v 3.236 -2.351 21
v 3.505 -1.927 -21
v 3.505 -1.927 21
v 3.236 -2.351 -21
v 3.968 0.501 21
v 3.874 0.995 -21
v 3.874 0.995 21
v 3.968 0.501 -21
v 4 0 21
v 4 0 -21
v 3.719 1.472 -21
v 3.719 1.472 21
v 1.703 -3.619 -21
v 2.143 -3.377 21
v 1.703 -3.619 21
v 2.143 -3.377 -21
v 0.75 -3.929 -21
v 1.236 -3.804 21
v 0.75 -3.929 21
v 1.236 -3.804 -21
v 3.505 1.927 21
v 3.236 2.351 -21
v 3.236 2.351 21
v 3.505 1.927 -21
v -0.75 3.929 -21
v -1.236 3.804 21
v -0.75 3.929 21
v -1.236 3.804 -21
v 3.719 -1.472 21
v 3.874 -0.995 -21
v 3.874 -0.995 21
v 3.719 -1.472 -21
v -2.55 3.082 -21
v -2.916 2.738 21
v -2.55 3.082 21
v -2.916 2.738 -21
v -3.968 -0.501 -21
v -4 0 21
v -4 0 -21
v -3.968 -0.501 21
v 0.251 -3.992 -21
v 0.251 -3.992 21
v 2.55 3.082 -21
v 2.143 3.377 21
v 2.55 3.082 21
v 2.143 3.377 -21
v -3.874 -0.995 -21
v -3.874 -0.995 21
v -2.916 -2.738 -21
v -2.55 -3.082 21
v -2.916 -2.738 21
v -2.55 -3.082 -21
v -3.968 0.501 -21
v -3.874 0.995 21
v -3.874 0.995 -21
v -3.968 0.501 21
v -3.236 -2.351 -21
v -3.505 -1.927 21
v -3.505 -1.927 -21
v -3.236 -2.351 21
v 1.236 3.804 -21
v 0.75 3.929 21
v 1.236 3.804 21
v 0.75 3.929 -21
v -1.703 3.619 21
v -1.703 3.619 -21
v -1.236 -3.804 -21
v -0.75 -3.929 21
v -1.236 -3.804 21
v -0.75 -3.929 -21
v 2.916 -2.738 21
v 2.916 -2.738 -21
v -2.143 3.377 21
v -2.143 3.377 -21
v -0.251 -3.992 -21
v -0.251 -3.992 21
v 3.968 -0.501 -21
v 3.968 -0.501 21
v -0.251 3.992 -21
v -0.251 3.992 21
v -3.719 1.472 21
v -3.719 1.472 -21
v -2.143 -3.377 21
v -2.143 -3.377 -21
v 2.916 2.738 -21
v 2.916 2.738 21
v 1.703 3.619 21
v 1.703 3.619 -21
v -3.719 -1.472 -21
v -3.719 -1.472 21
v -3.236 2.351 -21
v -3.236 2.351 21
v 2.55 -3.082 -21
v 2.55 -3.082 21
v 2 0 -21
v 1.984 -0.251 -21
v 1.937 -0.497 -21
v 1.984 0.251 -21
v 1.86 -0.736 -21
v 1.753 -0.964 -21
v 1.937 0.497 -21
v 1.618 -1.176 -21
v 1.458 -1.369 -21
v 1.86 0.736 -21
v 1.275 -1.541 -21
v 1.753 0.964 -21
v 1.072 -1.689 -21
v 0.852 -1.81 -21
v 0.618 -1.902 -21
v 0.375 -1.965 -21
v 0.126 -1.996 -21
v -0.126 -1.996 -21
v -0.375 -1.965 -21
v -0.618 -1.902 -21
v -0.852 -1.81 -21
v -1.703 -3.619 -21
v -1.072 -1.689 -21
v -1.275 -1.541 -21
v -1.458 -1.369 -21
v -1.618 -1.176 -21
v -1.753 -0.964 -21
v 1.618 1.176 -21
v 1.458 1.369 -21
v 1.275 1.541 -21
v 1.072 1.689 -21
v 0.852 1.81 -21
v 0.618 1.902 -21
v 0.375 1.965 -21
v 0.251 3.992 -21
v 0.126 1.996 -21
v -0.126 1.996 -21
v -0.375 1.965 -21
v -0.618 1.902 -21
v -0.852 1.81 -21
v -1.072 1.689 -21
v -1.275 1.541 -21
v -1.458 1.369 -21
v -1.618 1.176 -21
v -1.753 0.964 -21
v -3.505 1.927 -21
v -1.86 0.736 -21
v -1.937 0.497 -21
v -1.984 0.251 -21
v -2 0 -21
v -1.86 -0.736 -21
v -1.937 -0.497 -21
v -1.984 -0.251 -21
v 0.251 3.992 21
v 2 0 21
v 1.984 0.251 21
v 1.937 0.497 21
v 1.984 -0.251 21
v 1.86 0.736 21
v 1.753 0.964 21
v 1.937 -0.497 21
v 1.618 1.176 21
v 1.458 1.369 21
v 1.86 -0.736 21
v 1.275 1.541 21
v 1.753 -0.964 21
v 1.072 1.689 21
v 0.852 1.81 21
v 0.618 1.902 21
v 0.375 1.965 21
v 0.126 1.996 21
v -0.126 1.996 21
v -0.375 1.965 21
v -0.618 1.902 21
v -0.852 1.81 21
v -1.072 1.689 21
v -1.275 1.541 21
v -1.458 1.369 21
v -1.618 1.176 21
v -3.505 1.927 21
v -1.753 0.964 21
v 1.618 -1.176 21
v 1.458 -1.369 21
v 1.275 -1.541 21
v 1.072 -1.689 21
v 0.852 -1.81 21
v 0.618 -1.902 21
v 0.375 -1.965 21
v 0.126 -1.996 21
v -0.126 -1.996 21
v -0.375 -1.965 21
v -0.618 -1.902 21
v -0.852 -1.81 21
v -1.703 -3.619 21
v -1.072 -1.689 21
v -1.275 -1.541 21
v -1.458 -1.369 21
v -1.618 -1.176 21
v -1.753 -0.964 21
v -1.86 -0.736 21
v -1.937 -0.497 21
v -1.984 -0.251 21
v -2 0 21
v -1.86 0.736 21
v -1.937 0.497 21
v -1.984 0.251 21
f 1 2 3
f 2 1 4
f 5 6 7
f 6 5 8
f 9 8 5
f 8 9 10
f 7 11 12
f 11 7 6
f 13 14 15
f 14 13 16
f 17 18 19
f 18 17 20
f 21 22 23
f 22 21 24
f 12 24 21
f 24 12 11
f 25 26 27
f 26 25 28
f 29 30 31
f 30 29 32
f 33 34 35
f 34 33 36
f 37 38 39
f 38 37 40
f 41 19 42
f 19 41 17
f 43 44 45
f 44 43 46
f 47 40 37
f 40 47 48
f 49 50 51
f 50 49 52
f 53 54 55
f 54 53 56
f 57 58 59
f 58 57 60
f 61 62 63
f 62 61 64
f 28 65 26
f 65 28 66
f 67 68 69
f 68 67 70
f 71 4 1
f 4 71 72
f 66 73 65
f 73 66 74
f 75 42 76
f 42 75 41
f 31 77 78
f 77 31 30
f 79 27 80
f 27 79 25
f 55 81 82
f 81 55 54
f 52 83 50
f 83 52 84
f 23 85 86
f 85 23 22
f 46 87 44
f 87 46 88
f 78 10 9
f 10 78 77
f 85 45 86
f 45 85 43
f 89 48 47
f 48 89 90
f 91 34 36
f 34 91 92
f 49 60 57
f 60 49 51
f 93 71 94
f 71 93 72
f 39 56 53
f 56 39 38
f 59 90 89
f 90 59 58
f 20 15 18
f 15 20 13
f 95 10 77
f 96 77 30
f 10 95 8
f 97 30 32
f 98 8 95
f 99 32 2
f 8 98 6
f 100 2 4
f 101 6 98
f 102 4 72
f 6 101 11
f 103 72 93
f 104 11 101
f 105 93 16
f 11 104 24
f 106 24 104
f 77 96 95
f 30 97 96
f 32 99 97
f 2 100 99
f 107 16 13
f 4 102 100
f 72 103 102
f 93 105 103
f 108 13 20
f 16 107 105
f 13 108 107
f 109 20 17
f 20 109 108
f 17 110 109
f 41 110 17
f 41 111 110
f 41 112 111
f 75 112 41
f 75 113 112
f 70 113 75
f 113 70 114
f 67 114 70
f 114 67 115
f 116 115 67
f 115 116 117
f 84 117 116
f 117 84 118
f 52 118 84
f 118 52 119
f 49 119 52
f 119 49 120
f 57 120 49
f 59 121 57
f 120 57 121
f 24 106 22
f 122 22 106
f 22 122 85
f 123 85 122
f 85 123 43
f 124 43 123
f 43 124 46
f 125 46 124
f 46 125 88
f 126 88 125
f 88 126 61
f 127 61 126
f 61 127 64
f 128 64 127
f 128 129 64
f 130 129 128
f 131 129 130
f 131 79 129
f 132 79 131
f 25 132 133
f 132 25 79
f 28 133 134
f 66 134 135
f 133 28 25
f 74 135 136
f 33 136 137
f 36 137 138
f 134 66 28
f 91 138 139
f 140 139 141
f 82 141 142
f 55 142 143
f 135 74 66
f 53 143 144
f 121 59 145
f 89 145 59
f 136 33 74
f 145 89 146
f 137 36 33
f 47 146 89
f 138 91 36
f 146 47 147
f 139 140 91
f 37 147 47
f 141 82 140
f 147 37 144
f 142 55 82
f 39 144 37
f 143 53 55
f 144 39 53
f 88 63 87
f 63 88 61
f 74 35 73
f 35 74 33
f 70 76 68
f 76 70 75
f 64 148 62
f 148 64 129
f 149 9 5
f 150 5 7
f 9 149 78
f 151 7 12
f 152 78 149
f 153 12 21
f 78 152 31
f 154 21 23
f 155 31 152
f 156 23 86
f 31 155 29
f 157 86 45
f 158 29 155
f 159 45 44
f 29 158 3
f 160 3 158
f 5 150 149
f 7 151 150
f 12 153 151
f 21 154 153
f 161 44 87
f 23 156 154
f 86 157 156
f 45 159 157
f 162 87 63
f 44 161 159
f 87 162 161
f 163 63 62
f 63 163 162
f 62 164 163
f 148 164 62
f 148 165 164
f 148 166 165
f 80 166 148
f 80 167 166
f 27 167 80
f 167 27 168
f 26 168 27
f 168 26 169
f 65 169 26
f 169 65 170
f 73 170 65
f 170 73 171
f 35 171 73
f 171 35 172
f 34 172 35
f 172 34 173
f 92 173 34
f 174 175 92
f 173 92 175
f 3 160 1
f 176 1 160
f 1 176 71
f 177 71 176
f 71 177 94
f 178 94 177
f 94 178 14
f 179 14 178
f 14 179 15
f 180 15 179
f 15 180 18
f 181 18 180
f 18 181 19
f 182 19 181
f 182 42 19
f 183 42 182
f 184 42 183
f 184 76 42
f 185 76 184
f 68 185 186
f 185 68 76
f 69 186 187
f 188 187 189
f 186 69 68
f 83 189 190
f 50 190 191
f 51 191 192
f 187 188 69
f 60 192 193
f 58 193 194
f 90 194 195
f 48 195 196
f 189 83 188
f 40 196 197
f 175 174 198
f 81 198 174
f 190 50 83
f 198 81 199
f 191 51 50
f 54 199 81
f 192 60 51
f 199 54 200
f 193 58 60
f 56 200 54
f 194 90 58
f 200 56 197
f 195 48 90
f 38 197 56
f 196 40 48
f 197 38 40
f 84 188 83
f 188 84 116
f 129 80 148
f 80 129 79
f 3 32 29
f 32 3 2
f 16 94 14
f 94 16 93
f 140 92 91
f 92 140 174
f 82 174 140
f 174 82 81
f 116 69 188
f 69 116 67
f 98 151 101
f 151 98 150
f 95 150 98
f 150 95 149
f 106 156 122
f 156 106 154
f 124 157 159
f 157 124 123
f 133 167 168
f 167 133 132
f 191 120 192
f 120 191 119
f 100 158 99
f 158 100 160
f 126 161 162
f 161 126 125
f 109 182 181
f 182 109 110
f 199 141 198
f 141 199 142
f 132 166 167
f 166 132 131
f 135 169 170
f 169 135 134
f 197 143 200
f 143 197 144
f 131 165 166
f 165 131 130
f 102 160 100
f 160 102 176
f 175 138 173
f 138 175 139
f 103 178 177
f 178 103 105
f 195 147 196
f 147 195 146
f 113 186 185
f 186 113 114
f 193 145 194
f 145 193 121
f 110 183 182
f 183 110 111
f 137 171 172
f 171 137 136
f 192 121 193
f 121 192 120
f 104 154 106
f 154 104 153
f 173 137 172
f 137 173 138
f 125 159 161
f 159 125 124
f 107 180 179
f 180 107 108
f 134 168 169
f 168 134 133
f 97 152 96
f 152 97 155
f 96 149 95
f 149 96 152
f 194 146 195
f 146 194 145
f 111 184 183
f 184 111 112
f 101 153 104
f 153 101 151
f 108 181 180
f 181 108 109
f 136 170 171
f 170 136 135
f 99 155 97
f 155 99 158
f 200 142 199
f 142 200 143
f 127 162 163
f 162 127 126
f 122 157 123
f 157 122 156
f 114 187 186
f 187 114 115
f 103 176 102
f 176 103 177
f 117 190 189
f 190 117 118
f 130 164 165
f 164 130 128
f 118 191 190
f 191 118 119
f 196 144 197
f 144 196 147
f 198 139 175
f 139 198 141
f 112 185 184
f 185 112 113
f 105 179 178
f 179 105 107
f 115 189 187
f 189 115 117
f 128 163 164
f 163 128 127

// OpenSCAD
$fn = 50;


difference() {
	union() {
		translate(v = [0, 0, -21.0000000000]) {
			cylinder(h = 42, r = 4.0000000000);
		}
	}
	union() {
		translate(v = [0, 0, -100.0000000000]) {
			cylinder(h = 200, r = 2.0000000000);
		}
	}
}
